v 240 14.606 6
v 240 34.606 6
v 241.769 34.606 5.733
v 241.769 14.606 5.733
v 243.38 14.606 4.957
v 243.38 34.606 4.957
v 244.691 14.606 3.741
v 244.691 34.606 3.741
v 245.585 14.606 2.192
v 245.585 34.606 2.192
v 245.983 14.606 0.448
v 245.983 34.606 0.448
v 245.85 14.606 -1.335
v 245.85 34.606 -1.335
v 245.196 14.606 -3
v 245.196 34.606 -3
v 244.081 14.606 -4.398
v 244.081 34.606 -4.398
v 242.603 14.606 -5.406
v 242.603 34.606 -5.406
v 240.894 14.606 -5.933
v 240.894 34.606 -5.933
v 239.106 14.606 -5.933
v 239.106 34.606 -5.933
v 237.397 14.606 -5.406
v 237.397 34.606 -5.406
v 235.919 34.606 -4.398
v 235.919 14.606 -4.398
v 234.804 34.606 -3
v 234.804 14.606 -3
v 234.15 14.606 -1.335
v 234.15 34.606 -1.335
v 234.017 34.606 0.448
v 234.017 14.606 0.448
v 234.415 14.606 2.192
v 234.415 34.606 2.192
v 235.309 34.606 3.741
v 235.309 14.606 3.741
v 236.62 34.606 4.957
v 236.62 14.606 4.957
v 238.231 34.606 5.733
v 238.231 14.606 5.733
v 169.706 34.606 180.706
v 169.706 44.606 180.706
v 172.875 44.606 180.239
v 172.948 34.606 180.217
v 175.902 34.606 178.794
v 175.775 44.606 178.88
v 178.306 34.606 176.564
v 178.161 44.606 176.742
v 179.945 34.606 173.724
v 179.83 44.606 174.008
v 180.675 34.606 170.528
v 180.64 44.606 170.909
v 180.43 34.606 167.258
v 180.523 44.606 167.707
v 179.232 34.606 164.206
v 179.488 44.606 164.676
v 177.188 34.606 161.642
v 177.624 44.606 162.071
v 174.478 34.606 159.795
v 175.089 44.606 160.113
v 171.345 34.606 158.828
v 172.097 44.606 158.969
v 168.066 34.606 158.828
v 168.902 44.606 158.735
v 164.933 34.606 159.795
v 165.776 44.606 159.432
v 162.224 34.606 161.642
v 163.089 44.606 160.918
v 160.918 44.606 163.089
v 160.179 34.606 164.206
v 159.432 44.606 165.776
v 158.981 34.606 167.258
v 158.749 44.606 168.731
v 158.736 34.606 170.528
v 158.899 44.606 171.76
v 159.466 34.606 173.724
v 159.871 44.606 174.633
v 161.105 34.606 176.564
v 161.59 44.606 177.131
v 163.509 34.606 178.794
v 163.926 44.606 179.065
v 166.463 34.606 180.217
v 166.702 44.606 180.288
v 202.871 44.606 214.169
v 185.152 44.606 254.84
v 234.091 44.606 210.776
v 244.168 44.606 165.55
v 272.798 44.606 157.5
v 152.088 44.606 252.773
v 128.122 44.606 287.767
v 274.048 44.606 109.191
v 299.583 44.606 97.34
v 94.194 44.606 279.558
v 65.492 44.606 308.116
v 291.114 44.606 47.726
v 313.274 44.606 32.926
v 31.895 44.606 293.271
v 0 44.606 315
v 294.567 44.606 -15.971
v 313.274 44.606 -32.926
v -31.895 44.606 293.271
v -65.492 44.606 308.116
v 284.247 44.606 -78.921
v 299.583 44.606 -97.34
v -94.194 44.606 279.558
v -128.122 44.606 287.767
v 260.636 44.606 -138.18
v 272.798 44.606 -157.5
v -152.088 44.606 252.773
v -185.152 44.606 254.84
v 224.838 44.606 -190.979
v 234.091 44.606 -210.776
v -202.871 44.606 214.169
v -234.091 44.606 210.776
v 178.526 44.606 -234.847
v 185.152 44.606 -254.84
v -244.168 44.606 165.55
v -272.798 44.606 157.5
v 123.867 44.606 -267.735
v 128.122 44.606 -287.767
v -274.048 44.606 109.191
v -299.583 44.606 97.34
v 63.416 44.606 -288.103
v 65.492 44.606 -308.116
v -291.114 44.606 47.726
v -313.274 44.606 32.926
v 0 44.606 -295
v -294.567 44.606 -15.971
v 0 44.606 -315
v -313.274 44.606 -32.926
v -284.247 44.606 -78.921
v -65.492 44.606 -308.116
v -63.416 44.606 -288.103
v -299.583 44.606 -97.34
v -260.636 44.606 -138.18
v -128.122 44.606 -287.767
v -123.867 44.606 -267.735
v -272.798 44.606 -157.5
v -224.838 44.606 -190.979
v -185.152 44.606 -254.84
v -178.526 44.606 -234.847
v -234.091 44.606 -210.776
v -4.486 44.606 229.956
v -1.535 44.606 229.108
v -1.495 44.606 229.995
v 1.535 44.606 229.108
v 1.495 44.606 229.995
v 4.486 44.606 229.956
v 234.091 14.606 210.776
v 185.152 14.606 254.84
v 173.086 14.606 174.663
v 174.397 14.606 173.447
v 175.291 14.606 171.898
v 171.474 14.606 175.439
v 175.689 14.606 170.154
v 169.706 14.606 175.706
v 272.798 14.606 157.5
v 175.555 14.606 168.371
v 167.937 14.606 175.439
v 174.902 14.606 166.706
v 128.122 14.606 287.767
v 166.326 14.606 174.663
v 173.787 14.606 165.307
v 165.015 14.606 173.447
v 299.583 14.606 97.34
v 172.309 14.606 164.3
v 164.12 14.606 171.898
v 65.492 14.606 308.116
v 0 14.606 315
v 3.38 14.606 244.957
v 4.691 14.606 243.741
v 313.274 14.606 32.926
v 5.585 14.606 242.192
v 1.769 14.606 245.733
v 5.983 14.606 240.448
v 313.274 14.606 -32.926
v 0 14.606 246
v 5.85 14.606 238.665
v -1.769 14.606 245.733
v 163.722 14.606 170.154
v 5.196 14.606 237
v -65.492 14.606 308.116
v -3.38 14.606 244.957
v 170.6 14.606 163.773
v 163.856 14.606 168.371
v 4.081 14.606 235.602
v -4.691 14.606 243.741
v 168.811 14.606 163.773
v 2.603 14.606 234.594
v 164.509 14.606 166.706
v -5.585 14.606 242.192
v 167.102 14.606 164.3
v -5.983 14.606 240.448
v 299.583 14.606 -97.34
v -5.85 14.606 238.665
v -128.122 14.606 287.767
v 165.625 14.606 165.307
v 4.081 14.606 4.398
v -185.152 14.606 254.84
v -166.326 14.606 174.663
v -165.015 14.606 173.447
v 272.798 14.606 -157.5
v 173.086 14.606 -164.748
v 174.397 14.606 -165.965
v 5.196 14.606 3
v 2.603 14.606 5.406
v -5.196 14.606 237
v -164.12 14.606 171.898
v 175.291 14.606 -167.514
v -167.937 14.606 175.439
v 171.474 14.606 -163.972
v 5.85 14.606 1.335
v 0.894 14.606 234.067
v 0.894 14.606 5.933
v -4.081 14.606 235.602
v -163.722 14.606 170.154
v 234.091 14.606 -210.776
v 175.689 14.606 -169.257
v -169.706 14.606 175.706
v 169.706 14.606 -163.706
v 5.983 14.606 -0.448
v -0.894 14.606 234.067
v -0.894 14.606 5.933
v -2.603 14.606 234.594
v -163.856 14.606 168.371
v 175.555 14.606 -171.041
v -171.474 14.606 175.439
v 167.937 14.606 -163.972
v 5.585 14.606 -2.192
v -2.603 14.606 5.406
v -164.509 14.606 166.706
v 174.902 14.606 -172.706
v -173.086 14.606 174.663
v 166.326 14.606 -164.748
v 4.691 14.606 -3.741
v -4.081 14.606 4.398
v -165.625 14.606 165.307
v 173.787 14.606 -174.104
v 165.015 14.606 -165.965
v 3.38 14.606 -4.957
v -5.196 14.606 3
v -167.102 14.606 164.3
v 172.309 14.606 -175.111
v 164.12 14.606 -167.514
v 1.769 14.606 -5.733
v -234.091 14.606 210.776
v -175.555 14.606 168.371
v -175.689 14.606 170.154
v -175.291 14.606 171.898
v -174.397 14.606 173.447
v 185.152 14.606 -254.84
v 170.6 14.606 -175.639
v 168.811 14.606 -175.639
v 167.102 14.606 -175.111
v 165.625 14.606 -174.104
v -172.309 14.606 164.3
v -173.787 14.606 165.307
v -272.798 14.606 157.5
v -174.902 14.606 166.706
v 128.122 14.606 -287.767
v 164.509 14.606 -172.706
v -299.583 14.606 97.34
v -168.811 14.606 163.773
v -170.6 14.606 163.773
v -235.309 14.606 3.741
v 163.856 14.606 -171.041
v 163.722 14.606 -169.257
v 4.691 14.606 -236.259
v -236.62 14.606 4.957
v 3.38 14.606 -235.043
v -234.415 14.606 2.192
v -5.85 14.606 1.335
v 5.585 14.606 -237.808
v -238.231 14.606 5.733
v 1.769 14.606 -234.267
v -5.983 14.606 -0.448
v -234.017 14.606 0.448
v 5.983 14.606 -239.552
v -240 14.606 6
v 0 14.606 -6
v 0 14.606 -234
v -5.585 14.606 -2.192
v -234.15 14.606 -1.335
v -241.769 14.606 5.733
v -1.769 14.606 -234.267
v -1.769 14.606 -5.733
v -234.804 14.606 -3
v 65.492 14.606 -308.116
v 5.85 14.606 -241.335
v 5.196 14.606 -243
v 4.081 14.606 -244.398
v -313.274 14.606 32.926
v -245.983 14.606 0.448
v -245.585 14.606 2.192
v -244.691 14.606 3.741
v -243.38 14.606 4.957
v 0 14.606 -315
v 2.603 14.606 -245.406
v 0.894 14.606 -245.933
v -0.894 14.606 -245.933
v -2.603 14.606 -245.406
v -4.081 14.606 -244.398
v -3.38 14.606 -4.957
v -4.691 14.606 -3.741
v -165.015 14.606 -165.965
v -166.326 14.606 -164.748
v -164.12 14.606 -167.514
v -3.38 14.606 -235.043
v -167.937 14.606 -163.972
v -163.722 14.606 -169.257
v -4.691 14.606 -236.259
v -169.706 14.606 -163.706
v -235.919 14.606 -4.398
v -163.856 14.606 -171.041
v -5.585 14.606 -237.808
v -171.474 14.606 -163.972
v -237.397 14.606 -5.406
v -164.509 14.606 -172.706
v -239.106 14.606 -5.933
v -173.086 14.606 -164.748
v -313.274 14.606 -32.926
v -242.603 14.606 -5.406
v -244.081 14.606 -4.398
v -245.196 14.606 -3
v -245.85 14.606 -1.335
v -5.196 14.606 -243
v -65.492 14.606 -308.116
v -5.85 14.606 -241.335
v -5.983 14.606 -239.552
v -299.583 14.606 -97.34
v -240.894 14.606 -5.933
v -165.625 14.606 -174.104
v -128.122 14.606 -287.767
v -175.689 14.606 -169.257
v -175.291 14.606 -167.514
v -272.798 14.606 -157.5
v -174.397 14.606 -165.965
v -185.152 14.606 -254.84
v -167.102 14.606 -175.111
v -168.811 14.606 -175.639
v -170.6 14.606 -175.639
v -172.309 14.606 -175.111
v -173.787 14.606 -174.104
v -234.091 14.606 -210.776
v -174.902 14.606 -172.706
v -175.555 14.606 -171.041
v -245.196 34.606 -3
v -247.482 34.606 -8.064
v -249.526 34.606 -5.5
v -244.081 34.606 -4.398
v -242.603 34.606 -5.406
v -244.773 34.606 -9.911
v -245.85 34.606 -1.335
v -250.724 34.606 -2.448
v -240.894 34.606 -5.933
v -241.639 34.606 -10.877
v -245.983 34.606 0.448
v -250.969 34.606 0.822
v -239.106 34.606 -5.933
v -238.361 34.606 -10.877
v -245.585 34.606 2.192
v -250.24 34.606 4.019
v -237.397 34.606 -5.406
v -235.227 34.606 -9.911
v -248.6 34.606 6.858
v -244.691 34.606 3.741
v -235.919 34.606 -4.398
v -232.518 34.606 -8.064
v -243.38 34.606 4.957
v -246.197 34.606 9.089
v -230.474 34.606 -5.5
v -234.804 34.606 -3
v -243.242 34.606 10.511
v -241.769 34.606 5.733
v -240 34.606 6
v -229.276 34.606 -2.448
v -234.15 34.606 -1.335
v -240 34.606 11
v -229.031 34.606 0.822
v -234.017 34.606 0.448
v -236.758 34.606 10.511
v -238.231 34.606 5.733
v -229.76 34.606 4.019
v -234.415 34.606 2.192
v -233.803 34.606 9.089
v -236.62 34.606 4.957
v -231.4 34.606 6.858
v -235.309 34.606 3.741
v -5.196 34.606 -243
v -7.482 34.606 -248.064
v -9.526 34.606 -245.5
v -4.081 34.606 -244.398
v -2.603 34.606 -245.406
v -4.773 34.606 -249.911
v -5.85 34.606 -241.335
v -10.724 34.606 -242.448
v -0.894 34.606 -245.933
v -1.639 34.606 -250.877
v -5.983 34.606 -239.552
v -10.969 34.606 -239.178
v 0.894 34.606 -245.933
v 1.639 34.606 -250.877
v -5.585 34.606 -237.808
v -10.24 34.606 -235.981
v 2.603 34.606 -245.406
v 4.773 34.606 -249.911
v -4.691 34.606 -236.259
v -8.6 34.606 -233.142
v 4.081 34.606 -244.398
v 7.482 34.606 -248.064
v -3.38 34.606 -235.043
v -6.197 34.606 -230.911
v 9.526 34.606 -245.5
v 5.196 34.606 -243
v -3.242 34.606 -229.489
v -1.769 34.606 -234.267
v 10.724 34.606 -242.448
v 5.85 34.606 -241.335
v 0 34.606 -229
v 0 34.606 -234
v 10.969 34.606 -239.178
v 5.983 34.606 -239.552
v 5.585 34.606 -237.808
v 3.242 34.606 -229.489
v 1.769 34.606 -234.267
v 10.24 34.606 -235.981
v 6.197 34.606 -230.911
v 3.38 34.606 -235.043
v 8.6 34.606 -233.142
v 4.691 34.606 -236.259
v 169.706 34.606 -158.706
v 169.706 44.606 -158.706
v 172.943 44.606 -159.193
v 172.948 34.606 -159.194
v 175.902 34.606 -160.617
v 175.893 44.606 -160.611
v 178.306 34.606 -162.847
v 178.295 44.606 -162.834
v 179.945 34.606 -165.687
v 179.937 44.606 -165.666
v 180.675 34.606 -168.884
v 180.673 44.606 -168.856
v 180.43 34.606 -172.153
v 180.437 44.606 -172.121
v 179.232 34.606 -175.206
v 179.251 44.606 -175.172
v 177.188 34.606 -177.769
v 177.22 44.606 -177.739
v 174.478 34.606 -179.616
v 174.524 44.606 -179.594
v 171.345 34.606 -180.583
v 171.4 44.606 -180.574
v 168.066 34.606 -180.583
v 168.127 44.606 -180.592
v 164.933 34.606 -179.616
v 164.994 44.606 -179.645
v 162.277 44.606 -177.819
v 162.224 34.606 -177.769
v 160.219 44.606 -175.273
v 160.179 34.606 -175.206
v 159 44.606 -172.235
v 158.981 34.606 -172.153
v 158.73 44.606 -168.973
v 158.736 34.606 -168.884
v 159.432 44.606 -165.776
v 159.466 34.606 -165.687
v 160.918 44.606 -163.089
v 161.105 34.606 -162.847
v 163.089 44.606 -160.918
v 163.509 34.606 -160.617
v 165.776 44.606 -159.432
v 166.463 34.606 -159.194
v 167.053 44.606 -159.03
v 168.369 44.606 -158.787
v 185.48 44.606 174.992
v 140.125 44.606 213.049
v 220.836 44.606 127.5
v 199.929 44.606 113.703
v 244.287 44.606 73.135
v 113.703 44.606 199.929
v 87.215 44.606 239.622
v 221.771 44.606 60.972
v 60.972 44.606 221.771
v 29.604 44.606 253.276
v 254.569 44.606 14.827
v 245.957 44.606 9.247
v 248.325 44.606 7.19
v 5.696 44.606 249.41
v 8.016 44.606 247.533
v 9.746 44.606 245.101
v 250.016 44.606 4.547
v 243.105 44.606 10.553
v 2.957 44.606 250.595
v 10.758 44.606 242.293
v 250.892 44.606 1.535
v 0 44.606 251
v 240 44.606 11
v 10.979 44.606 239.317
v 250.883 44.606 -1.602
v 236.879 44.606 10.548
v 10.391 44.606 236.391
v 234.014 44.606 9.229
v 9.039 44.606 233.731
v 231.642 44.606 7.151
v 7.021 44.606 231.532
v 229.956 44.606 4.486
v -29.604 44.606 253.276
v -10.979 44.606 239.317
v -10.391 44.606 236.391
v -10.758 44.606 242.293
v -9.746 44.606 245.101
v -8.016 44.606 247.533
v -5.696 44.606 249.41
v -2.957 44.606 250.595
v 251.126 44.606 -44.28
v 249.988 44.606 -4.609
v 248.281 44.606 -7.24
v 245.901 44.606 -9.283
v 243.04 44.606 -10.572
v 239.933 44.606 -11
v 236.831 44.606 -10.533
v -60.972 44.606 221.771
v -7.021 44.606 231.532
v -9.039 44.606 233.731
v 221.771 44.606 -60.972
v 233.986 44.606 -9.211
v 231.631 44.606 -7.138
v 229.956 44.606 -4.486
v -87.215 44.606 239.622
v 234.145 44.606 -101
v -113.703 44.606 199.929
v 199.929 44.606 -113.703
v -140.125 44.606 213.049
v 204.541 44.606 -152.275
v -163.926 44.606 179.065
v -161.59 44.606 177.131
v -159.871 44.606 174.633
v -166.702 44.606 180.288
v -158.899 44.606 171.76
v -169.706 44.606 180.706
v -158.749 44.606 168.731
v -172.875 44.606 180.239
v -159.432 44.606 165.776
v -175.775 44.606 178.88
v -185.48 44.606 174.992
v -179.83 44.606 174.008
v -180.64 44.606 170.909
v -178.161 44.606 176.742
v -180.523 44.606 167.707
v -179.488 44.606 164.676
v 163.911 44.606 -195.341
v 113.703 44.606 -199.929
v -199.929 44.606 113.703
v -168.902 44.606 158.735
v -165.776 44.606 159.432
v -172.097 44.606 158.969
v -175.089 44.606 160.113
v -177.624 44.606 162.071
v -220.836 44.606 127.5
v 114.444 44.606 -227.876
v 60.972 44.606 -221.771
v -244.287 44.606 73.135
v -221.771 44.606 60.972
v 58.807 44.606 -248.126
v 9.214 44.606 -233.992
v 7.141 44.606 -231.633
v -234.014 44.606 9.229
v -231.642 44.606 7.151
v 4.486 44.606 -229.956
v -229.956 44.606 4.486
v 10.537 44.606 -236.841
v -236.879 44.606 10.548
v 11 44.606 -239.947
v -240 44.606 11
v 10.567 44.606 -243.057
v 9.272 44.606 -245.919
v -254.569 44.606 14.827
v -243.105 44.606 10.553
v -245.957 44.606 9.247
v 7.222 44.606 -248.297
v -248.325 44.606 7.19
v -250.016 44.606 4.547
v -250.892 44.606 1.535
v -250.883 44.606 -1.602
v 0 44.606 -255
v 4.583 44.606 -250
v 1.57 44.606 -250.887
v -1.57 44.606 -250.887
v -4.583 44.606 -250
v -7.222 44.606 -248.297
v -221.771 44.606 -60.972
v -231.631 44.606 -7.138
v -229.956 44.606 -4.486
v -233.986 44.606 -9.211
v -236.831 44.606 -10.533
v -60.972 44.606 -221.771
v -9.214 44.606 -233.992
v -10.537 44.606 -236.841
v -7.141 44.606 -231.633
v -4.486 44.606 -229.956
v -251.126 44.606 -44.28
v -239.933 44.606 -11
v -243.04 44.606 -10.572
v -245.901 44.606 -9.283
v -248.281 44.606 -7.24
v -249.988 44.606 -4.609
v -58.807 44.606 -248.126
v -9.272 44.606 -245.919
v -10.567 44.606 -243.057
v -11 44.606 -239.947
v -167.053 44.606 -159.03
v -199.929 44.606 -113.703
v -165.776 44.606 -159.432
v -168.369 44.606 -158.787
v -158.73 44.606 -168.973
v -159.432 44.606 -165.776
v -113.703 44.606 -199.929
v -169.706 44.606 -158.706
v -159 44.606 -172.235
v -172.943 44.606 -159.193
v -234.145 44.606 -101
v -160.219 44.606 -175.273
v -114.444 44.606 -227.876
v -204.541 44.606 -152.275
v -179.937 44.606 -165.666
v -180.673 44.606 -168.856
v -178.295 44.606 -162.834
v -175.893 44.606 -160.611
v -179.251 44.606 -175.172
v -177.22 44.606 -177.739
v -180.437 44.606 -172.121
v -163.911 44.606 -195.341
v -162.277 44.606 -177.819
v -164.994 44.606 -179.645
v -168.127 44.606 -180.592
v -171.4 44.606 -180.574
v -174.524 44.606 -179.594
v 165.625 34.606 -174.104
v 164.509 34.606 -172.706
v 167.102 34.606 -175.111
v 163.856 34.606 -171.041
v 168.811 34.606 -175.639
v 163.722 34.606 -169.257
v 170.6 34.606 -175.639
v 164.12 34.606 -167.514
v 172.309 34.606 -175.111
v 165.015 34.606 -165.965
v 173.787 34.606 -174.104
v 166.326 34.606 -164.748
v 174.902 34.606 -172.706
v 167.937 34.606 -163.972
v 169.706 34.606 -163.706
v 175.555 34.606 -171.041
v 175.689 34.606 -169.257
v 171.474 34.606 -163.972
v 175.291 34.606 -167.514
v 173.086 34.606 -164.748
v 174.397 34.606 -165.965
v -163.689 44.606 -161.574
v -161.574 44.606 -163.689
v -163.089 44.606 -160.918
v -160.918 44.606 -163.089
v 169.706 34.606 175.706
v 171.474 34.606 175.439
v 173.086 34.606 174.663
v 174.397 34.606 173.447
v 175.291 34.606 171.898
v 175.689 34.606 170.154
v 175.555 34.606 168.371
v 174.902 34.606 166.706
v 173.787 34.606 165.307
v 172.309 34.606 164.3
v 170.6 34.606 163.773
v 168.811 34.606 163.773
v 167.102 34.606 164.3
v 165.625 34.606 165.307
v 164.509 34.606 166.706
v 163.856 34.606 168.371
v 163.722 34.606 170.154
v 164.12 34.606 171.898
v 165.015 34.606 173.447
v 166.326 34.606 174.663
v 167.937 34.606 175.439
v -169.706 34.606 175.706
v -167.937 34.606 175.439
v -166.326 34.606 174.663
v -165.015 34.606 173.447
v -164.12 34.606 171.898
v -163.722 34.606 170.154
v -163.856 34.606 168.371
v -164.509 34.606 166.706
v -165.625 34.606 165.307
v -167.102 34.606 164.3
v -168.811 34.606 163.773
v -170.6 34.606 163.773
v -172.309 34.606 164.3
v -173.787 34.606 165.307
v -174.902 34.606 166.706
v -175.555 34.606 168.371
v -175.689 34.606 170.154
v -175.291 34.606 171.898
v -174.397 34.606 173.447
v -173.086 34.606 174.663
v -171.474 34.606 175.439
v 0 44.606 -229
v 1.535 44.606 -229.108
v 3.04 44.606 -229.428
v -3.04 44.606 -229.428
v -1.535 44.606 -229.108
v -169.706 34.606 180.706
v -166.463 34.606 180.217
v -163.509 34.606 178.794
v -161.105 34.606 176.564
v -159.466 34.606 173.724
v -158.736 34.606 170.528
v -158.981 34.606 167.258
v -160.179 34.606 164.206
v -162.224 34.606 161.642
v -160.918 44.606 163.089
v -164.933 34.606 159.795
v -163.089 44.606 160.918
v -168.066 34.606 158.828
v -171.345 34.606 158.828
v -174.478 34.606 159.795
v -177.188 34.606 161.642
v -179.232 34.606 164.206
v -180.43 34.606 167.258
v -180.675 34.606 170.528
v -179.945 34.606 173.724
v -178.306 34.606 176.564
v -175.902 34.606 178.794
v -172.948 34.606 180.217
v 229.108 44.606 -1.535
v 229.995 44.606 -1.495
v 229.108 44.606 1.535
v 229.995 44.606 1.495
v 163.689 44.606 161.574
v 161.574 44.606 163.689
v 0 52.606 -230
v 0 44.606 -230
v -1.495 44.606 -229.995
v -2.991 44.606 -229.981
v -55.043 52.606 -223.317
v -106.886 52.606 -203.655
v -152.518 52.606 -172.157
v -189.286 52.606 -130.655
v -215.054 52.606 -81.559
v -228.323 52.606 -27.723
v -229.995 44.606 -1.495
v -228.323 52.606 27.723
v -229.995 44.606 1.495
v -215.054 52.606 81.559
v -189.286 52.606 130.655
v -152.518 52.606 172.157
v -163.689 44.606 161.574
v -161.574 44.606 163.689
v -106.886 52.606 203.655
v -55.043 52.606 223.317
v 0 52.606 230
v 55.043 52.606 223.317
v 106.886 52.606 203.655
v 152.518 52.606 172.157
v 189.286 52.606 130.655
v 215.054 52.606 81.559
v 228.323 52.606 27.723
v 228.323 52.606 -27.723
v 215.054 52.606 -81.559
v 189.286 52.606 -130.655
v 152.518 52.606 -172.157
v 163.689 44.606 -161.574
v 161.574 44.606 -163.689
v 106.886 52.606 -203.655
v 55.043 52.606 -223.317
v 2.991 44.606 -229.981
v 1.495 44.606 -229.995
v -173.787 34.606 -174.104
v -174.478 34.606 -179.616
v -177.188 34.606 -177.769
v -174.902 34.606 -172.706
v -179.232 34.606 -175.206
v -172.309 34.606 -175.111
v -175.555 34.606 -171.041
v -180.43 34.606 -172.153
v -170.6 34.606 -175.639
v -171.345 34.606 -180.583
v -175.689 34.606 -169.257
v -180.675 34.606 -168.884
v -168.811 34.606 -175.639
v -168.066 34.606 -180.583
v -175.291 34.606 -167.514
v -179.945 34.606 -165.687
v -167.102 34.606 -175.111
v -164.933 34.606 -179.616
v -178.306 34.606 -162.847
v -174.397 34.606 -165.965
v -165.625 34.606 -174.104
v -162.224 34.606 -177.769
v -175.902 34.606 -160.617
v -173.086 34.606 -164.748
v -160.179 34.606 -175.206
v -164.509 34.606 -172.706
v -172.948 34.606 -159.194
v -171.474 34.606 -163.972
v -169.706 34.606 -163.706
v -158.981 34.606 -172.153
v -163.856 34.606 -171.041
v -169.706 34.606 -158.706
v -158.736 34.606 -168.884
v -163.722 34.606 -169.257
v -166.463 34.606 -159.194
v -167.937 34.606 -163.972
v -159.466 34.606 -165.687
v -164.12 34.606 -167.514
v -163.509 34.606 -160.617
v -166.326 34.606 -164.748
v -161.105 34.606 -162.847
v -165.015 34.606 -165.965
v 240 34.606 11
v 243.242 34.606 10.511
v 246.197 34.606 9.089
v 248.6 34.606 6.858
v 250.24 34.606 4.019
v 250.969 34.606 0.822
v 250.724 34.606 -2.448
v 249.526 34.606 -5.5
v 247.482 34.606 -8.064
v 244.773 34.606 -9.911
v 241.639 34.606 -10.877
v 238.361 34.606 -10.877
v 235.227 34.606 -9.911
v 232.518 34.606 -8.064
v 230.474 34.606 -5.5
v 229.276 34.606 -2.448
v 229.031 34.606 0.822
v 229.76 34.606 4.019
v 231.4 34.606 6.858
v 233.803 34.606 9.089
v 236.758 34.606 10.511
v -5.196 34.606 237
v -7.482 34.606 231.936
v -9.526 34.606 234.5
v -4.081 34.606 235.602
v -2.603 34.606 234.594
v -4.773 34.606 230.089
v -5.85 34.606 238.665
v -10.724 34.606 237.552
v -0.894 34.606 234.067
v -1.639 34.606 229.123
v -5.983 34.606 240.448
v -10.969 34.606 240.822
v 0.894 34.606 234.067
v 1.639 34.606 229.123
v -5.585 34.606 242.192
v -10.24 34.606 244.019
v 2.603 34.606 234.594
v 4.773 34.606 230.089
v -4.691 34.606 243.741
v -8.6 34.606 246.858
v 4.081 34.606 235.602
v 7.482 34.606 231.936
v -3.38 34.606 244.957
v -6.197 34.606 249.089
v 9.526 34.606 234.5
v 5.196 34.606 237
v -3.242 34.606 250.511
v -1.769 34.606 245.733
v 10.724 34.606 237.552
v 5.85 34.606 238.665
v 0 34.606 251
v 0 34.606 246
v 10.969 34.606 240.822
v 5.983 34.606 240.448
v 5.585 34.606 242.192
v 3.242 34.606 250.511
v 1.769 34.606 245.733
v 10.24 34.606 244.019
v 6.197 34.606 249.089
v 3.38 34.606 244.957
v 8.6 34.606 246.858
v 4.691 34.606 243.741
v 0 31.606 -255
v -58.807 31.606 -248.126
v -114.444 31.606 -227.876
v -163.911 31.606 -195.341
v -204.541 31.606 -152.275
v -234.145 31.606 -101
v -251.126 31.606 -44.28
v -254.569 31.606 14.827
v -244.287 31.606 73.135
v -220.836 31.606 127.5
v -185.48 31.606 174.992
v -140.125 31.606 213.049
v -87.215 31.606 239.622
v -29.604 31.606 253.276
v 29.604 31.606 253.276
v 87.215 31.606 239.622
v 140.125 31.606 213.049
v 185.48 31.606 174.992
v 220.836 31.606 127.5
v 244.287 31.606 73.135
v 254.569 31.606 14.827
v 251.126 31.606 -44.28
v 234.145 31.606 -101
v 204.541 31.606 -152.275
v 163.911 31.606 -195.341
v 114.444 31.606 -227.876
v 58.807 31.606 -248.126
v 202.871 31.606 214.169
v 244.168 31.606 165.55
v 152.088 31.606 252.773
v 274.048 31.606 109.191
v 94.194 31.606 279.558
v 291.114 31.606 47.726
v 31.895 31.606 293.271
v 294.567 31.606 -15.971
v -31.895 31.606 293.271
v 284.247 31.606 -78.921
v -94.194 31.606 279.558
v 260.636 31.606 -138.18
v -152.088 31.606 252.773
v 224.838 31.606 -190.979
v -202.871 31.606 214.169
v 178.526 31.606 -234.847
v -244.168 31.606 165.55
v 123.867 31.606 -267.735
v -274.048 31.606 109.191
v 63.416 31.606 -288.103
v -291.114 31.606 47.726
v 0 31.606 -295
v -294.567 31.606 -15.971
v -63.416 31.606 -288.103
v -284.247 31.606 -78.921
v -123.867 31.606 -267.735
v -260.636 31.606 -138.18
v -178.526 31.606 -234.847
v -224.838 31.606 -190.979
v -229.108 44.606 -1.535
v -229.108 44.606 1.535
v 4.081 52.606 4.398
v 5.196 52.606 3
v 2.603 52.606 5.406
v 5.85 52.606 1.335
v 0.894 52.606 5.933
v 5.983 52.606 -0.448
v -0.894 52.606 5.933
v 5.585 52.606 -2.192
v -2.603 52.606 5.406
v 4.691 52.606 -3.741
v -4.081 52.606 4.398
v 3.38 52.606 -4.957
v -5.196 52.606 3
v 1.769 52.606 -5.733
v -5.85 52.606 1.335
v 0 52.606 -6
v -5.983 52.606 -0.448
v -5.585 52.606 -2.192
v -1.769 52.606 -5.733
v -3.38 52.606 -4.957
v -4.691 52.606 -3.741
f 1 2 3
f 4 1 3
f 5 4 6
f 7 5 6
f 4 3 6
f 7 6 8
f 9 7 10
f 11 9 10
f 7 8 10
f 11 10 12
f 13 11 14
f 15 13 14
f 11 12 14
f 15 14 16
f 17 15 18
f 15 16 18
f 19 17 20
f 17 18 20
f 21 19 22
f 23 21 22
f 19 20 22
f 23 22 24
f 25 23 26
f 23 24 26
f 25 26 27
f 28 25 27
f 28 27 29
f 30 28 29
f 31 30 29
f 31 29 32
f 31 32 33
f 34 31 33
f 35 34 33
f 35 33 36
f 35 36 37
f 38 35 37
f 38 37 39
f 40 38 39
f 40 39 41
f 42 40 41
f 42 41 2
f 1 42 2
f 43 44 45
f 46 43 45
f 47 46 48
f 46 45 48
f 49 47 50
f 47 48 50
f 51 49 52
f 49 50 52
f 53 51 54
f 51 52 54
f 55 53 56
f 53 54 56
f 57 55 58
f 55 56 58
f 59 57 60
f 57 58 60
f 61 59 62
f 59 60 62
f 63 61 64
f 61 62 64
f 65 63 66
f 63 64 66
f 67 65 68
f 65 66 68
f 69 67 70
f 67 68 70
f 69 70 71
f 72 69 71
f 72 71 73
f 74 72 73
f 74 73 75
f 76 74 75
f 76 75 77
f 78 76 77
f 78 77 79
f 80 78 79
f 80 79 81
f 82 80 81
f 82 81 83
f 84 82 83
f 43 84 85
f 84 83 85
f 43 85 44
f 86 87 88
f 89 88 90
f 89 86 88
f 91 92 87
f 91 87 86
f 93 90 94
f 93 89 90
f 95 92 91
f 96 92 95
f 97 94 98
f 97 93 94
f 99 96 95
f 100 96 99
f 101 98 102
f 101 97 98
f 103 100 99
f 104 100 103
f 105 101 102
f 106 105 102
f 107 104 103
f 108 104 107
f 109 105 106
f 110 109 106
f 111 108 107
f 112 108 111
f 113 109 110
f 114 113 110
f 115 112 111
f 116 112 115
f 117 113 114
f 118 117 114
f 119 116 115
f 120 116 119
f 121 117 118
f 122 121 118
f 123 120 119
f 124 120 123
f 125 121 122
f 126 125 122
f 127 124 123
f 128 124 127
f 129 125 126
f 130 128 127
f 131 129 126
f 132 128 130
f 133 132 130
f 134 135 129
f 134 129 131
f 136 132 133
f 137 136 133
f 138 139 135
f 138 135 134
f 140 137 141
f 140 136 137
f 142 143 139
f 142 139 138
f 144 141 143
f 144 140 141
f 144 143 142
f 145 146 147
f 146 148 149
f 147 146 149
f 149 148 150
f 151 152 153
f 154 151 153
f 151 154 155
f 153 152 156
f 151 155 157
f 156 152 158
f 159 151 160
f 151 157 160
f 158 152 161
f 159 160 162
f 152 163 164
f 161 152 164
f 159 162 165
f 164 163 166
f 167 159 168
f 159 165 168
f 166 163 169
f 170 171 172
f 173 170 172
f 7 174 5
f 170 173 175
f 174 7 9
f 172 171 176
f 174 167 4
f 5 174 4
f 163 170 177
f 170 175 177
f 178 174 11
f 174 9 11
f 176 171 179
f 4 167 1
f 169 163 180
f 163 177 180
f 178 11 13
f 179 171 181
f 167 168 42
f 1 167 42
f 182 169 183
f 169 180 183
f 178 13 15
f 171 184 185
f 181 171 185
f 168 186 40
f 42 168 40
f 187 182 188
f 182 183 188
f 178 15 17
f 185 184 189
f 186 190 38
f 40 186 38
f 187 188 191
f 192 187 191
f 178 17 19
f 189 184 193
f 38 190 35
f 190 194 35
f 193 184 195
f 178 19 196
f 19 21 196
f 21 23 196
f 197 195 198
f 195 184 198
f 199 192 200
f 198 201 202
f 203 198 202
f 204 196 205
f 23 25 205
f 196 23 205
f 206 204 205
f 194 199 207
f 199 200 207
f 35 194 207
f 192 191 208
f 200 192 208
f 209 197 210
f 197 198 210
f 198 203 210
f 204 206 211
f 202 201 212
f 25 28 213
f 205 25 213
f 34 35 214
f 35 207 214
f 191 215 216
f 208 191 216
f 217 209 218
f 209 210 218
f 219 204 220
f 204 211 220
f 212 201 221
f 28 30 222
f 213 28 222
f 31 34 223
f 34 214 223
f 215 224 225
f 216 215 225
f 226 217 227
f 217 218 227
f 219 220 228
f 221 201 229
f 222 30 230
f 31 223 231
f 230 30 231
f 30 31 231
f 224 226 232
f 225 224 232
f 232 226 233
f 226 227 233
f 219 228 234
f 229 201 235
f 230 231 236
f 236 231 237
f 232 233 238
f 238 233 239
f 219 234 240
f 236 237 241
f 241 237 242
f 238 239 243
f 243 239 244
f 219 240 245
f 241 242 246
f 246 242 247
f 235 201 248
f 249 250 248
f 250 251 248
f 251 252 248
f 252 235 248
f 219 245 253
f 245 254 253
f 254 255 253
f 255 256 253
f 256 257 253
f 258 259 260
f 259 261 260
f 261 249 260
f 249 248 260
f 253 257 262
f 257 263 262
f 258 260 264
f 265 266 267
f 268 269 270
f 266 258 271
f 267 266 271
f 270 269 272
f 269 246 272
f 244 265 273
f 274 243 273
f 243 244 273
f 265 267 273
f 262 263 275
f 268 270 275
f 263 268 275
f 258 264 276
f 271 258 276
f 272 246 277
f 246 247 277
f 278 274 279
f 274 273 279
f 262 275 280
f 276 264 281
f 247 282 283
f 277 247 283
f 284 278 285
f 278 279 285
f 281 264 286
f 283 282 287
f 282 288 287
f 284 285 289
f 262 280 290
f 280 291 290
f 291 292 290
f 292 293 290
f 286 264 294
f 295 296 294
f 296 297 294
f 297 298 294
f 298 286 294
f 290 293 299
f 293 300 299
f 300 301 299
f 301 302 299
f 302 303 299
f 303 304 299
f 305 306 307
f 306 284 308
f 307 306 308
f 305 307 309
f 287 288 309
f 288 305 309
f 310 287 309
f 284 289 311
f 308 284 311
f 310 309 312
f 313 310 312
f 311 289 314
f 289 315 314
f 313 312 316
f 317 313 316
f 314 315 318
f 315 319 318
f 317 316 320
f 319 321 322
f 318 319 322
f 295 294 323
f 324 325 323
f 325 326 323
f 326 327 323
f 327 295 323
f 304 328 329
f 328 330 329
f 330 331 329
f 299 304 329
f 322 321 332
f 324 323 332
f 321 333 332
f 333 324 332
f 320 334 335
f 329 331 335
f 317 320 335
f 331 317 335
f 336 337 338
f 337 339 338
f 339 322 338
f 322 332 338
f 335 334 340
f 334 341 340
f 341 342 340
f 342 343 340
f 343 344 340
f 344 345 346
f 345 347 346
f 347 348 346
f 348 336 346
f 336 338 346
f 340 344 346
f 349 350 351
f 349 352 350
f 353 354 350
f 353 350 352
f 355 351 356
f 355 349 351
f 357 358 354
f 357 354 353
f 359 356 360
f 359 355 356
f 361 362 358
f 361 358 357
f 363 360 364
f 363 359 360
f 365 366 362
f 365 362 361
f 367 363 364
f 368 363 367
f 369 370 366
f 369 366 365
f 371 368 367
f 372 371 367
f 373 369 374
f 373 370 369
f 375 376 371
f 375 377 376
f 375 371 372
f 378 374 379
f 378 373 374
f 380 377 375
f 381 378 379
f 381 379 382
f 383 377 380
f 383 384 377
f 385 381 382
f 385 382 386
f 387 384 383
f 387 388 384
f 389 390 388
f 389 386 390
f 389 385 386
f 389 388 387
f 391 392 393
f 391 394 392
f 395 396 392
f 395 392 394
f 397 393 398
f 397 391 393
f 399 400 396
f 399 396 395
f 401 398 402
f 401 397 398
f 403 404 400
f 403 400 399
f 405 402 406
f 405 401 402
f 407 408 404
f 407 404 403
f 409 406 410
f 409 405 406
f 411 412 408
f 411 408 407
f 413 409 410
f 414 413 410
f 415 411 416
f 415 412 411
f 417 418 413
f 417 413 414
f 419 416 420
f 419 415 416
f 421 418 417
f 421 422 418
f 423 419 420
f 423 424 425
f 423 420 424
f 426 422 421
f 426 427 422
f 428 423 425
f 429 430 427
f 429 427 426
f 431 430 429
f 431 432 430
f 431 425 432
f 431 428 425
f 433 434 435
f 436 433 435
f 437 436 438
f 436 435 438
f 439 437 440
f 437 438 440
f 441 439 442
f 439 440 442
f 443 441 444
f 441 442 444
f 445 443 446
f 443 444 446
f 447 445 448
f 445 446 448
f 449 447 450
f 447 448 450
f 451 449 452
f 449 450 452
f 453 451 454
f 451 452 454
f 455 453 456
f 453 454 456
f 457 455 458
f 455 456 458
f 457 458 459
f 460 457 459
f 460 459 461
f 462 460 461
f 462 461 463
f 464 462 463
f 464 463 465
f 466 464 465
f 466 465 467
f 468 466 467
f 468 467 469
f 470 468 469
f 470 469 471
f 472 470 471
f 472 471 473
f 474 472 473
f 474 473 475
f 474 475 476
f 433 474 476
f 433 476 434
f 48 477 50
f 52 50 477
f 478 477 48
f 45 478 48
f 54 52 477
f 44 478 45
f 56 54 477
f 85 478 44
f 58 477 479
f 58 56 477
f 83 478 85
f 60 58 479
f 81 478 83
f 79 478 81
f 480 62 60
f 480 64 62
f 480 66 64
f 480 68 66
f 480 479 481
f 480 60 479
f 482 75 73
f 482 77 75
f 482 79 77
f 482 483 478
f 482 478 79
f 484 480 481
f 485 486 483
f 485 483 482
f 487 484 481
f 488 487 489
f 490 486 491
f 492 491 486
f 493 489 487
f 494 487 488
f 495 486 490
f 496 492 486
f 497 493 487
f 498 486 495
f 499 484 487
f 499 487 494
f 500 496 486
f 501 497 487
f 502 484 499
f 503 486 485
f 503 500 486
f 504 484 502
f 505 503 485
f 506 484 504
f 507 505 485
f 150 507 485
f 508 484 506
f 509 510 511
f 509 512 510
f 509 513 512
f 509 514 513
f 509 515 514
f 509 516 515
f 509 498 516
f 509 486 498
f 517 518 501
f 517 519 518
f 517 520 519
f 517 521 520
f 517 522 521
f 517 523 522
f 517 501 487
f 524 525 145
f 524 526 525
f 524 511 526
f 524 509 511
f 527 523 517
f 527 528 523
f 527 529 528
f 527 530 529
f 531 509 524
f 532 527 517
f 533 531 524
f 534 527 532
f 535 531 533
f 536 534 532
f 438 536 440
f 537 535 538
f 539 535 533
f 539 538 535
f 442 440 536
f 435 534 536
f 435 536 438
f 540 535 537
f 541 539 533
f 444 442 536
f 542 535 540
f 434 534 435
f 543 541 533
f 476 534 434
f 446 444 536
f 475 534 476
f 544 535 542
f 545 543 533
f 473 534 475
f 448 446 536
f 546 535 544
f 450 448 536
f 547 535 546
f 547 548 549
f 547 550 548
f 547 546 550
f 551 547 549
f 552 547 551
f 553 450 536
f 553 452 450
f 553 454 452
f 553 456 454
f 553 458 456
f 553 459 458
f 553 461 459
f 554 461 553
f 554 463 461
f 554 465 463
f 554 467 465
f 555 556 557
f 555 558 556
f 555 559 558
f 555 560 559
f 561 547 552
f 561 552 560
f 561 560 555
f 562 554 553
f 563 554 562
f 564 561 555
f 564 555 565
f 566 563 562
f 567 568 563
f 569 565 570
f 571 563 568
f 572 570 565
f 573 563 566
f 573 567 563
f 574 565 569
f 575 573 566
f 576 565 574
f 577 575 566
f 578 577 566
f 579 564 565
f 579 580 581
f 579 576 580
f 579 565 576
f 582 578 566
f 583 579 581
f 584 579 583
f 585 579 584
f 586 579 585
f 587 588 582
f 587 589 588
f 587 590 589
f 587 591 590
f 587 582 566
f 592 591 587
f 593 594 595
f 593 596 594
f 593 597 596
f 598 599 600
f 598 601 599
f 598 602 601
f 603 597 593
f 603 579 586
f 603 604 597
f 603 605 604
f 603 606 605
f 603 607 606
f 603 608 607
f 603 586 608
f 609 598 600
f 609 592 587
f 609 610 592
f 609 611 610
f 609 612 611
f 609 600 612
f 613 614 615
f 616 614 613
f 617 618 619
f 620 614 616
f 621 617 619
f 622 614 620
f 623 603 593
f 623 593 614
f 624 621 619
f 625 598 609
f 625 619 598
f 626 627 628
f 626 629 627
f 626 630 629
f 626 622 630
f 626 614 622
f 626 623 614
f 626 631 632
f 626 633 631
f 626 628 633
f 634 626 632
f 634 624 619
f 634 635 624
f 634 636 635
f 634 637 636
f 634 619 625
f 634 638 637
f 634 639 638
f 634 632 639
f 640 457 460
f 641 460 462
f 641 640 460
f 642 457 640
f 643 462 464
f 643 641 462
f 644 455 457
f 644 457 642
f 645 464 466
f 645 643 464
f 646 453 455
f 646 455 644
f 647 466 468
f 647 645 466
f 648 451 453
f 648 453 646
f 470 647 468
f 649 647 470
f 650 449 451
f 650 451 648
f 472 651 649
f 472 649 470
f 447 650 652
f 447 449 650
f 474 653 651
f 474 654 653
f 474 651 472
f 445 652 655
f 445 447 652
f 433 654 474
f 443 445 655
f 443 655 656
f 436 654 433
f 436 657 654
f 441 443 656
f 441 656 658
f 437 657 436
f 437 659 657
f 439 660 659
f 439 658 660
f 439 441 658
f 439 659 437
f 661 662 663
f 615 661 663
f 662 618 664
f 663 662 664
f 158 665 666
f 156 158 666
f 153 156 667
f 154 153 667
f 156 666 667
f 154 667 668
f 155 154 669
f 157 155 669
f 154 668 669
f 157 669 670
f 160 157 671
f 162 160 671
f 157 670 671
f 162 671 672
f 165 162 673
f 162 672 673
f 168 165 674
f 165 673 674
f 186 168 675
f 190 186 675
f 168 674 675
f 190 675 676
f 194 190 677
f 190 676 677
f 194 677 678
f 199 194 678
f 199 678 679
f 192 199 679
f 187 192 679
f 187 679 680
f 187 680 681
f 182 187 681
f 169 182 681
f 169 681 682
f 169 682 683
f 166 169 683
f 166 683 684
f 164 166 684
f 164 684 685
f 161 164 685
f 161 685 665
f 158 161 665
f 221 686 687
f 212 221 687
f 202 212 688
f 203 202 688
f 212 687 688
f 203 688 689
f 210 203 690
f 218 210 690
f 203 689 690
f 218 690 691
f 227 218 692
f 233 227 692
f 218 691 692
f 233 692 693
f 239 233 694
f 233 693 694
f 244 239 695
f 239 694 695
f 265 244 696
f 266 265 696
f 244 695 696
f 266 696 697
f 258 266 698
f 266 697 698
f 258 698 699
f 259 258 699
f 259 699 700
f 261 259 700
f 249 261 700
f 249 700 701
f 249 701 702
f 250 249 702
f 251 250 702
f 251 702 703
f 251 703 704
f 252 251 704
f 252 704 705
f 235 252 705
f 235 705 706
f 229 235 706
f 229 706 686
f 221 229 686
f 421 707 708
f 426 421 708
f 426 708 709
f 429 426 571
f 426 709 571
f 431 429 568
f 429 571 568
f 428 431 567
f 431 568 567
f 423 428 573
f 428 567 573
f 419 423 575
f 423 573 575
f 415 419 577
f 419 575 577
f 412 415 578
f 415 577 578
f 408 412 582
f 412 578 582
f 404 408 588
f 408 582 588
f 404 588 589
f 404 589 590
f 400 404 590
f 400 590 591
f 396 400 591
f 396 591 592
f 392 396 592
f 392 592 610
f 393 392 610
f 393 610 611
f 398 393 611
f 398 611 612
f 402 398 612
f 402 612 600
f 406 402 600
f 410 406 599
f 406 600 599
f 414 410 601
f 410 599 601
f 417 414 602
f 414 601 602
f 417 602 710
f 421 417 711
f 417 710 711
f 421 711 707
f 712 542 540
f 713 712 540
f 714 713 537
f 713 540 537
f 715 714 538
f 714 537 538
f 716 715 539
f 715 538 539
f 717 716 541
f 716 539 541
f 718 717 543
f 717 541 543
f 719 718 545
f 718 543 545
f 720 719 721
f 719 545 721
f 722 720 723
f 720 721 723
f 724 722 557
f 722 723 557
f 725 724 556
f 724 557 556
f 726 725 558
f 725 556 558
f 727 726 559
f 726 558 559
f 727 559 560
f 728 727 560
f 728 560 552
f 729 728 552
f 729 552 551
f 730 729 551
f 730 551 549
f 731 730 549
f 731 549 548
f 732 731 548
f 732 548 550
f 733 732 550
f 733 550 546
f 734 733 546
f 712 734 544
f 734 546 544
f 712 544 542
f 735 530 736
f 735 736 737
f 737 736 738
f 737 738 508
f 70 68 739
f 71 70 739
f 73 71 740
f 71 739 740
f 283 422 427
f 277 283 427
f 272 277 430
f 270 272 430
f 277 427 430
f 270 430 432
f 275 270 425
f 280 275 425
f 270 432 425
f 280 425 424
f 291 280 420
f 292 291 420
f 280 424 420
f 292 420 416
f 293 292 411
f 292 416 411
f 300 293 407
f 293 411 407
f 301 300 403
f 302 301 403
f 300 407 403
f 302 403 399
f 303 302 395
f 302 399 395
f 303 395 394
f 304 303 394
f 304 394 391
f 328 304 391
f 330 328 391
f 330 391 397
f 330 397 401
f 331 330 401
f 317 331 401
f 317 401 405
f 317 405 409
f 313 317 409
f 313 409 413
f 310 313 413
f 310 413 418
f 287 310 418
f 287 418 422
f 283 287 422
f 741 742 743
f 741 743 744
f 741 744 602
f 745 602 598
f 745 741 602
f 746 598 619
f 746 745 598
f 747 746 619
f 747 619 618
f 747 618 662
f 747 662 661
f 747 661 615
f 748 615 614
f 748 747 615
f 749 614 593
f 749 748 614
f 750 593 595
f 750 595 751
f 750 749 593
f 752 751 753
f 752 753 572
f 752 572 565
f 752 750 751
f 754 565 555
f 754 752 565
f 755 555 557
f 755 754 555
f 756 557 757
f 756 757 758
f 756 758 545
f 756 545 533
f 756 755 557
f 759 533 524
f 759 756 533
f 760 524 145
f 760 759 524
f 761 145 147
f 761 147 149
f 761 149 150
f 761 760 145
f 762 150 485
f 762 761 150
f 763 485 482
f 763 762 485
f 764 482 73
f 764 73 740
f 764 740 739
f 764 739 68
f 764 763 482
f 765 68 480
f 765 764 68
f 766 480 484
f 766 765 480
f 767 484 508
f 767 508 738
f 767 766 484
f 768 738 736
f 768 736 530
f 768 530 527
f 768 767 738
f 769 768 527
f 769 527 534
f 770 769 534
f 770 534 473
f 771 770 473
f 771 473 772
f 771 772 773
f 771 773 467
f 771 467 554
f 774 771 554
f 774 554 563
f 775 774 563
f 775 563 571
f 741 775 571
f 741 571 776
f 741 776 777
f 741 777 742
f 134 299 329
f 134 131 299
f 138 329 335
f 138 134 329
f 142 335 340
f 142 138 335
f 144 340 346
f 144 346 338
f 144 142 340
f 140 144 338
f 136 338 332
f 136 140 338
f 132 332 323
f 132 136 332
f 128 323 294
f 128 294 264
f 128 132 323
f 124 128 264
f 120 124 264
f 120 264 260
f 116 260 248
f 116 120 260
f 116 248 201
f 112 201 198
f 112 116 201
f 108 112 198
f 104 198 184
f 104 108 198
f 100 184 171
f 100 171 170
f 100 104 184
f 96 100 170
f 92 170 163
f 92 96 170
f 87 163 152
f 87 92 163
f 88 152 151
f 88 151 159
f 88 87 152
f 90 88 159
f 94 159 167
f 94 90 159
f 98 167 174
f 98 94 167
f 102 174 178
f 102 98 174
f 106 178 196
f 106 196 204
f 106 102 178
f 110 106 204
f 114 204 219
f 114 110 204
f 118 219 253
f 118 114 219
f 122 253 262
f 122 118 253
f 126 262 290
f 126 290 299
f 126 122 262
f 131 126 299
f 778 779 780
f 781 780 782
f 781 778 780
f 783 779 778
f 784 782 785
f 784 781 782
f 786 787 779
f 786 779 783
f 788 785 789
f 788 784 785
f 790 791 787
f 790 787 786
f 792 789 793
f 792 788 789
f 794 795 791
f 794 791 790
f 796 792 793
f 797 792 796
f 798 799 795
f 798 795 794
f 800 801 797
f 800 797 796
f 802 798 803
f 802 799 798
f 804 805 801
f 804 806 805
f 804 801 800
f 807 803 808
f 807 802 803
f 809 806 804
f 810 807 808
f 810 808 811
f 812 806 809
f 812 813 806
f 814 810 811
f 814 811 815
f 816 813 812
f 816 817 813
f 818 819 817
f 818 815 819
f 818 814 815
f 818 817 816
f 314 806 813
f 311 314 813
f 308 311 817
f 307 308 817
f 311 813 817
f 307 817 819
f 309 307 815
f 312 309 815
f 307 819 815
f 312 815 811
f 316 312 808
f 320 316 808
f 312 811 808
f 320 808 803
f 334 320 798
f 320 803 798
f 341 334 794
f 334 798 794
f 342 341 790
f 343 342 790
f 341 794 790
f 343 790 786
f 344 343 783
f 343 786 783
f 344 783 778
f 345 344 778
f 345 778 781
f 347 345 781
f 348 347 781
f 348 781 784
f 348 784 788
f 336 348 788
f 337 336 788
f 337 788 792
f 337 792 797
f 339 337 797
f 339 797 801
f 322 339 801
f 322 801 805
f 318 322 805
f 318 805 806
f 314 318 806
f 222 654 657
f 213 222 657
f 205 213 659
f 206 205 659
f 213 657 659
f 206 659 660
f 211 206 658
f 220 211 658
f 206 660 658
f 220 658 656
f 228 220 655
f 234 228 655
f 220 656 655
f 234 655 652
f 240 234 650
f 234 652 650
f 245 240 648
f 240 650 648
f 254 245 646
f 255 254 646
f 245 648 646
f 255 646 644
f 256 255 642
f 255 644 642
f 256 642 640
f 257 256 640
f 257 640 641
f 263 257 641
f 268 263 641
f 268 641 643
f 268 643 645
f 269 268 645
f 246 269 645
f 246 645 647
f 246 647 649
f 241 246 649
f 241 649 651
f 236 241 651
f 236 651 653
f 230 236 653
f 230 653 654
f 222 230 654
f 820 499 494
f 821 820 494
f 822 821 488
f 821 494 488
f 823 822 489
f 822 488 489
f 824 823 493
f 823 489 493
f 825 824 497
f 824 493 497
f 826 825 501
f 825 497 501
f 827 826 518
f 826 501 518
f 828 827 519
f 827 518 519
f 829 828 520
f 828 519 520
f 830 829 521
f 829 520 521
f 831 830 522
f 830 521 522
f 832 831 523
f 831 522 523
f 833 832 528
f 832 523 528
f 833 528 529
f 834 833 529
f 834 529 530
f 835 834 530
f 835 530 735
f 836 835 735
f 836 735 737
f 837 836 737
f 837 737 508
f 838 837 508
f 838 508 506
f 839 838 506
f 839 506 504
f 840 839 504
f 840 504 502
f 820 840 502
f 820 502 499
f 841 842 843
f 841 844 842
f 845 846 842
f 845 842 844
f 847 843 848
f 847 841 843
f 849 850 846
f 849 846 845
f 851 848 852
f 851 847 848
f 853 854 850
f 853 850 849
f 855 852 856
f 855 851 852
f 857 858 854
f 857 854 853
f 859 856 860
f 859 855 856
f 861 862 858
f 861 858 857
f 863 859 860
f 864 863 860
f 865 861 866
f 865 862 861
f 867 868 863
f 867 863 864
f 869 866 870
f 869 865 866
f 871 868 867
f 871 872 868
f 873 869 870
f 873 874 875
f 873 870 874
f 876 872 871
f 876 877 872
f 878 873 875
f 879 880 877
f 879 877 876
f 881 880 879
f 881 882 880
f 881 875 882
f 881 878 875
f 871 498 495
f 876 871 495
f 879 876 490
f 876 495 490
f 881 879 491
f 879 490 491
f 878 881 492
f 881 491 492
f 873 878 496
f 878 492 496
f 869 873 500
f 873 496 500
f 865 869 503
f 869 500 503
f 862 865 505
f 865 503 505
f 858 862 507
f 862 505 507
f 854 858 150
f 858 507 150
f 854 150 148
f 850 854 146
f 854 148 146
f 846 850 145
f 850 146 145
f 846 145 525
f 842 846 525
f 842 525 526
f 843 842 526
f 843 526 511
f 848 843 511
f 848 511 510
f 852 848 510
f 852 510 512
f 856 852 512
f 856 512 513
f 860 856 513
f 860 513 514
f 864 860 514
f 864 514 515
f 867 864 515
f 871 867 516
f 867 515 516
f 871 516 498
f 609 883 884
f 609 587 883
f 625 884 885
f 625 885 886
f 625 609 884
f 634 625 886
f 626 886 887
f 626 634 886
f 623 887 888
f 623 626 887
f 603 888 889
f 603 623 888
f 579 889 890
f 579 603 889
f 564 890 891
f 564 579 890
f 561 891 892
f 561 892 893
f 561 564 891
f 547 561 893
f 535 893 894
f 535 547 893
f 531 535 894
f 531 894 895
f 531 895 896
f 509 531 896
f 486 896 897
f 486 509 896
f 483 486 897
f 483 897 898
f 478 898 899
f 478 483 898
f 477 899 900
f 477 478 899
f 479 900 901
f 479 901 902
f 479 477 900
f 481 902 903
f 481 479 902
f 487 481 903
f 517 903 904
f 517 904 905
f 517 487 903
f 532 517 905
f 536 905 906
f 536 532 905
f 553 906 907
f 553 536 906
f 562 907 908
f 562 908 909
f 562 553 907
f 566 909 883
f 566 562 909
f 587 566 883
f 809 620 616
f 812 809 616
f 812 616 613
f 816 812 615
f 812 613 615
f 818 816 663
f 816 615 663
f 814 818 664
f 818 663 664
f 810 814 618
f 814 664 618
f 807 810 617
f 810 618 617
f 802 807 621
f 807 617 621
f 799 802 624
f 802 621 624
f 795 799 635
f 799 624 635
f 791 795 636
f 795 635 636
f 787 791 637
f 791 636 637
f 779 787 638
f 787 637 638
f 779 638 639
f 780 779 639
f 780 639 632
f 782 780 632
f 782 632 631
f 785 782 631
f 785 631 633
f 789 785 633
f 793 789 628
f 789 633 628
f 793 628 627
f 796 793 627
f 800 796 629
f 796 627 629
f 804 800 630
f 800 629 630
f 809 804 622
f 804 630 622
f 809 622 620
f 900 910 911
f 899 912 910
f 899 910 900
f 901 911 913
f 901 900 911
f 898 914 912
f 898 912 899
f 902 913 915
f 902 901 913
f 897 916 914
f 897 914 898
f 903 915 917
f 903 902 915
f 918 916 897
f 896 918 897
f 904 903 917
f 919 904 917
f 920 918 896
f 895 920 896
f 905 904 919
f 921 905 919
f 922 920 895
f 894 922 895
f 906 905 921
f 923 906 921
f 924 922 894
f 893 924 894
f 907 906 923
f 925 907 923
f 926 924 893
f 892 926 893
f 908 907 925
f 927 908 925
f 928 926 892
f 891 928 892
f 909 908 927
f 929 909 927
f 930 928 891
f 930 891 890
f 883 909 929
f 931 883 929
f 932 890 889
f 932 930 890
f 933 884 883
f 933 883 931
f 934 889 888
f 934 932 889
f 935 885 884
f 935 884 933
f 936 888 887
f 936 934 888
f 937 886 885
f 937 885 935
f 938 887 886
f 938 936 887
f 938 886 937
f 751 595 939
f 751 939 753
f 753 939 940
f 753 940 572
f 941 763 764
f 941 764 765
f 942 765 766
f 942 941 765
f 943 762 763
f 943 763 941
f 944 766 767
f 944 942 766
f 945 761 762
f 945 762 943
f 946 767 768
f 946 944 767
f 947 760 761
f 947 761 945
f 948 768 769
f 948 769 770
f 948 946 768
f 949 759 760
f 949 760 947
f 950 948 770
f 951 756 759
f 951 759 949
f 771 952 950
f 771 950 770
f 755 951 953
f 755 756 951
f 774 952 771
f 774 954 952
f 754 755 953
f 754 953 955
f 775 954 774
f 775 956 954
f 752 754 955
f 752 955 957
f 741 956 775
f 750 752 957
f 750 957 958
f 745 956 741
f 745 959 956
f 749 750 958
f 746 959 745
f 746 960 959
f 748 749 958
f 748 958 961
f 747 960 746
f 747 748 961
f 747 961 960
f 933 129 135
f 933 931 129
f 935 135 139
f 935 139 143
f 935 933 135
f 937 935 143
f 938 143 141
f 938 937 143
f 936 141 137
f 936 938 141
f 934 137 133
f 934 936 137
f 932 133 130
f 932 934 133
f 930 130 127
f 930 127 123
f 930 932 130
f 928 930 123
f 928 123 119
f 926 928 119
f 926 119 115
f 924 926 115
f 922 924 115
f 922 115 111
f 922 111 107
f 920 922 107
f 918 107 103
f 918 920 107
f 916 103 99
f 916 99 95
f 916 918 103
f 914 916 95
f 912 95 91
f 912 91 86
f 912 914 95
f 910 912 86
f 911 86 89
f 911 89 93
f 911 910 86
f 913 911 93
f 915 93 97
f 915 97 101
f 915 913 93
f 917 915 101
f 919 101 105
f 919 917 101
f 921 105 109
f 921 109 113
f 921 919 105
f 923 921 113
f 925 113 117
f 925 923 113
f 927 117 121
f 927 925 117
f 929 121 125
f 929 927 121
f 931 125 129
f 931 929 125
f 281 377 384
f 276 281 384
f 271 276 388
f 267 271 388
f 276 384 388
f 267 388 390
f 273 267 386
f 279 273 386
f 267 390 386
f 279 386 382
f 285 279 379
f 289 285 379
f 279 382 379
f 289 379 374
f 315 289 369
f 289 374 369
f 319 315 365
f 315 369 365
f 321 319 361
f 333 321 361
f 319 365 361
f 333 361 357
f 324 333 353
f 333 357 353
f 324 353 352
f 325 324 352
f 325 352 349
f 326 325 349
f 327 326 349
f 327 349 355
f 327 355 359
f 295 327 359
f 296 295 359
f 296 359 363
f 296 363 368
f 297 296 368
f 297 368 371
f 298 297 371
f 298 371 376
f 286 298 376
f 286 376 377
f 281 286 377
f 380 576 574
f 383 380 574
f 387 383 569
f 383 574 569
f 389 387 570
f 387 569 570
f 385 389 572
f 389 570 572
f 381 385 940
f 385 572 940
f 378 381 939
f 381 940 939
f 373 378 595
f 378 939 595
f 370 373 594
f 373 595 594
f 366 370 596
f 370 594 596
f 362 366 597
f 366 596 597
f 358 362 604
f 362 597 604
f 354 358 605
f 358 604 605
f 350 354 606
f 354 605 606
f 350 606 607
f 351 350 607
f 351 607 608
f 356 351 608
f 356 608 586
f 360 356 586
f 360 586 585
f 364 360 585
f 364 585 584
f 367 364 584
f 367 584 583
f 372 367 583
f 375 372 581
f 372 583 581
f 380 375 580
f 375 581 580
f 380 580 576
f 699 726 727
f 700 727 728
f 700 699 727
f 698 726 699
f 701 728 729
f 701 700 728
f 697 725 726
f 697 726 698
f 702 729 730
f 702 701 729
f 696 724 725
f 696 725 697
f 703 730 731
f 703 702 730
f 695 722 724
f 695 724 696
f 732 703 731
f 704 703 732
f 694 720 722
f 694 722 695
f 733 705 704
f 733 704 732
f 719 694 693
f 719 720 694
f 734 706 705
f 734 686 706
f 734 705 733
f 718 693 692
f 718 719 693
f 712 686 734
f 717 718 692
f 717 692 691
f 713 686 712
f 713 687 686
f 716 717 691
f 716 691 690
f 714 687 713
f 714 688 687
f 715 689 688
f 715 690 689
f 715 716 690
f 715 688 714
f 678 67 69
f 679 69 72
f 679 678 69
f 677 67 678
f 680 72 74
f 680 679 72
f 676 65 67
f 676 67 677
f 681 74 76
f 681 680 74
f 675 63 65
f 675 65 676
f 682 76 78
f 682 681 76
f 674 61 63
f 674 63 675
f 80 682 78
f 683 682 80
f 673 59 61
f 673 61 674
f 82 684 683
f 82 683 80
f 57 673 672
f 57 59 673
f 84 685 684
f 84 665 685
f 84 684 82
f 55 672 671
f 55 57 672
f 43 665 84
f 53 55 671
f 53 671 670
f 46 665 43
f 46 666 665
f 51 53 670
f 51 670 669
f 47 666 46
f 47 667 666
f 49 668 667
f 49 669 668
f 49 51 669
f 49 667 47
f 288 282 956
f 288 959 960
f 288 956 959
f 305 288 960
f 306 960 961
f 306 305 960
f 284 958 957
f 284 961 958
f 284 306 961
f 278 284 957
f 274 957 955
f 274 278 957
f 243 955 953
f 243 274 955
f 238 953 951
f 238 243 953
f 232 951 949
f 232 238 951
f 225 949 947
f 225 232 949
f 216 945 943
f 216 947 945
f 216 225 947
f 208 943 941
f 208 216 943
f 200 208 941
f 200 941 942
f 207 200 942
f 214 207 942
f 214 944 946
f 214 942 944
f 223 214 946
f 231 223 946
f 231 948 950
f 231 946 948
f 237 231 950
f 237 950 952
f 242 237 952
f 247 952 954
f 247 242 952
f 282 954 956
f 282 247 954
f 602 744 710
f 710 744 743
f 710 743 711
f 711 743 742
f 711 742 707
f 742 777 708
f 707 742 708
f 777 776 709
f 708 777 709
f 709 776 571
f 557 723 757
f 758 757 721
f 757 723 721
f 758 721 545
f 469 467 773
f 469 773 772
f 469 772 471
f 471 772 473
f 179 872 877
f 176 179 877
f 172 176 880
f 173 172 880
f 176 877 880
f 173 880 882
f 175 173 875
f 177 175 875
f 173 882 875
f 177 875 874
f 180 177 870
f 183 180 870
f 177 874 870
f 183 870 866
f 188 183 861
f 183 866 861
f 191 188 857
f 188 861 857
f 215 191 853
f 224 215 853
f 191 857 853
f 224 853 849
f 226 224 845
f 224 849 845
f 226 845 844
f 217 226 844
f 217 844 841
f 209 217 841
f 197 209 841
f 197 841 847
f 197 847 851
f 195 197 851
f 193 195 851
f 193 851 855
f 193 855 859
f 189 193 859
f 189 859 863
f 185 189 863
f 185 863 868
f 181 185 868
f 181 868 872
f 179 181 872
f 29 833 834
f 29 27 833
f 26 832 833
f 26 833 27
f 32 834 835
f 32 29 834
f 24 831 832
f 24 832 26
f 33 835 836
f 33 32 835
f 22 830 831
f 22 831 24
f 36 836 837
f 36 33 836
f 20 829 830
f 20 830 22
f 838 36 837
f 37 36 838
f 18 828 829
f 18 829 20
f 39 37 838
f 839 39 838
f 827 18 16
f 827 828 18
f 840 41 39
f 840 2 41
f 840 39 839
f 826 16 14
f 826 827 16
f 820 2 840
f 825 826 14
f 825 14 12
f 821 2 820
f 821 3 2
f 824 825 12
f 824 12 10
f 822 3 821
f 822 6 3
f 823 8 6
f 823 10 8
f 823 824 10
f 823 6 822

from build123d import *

# Parameters (mm, degrees)
SKETCH2_R               = 11
CUT_EXTRUDE1_DEPTH      = 10
SKETCH3_R               = 6
CUT_EXTRUDE2_DEPTH      = 447.486281987
CUT_EXTRUDE3_DEPTH      = 88
CUT_EXTRUDE3_DEPTH_BACK = 69
SKETCH4_R               = 6


with BuildPart() as part:
    # Sketch1 → Revolve1 (revolve)
    with BuildSketch(Plane(origin=(0, 0, 0), x_dir=(0, 0, -1), z_dir=(1, 0, 0)), mode=Mode.PRIVATE) as revolve1_sk:
        Polygon((-315.000000002, 14.605962764), (-315.000000002, 44.605962764), (-295.000000002, 44.605962764), (-295.000000002, 31.605962764), (-255.000000002, 31.605962764), (-255.000000002, 44.605962764), (-230, 44.605962764), (-230, 52.605962764), (0, 52.605962764), (0, 44.605962764), (0, 14.605962764), (-229.500000002, 14.605962764), align=None)
    revolve(revolve1_sk.sketch.rotate(Axis((0, -1000, 0), (0, 1, 0)), 180), axis=Axis((0, -1000, 0), (0, 1, 0)))

    # Sketch2 → Cut-Extrude1 (cut)
    with BuildSketch(Plane(origin=(0, 44.605962764, 0), x_dir=(1, 0, 0), z_dir=(0, 1, 0))):
        with Locations(Location((0, 240, 0), (0, 0, 270))):
            Circle(SKETCH2_R)
        with Locations(Location((169.705627485, 169.705627485, 0), (0, 0, 270))):
            Circle(SKETCH2_R)
        with Locations(Location((240, 0, 0), (0, 0, 270))):
            Circle(SKETCH2_R)
        with Locations(Location((169.705627485, -169.705627485, 0), (0, 0, 270))):
            Circle(SKETCH2_R)
        with Locations(Location((0, -240, 0), (0, 0, 270))):
            Circle(SKETCH2_R)
        with Locations(Location((-169.705627485, -169.705627485, 0), (0, 0, 270))):
            Circle(SKETCH2_R)
        with Locations(Location((-240, 0, 0), (0, 0, 270))):
            Circle(SKETCH2_R)
        with Locations(Location((-169.705627485, 169.705627485, 0), (0, 0, 270))):
            Circle(SKETCH2_R)
    extrude(amount=-CUT_EXTRUDE1_DEPTH, mode=Mode.SUBTRACT)

    # Sketch3 → Cut-Extrude2 (cut, through all)
    with BuildSketch(Plane(origin=(0, 44.605962764, 0), x_dir=(1, 0, 0), z_dir=(0, 1, 0))):
        with Locations(Location((0, 240, 0), (0, 0, 270))):
            Circle(SKETCH3_R)
        with Locations(Location((169.705627485, 169.705627485, 0), (0, 0, 270))):
            Circle(SKETCH3_R)
        with Locations(Location((240, 0, 0), (0, 0, 270))):
            Circle(SKETCH3_R)
        with Locations(Location((169.705627485, -169.705627485, 0), (0, 0, 270))):
            Circle(SKETCH3_R)
        with Locations(Location((0, -240, 0), (0, 0, 270))):
            Circle(SKETCH3_R)
        with Locations(Location((-169.705627485, -169.705627485, 0), (0, 0, 270))):
            Circle(SKETCH3_R)
        with Locations(Location((-240, 0, 0), (0, 0, 270))):
            Circle(SKETCH3_R)
        with Locations(Location((-169.705627485, 169.705627485, 0), (0, 0, 270))):
            Circle(SKETCH3_R)
    extrude(amount=-CUT_EXTRUDE2_DEPTH, mode=Mode.SUBTRACT)

    # Sketch4 → Cut-Extrude3 (cut, two sides: drawn at the far end of the back side and taken through both)
    with BuildSketch(Plane(origin=(0, 14.605962764, 0), x_dir=(1, 0, 0), z_dir=(0, 1, 0)).offset(-CUT_EXTRUDE3_DEPTH_BACK)):
        with Locations(Location((0, 0, 0), (0, 0, 90))):
            Circle(SKETCH4_R)
    extrude(amount=CUT_EXTRUDE3_DEPTH + CUT_EXTRUDE3_DEPTH_BACK, mode=Mode.SUBTRACT)


solid = part.part
